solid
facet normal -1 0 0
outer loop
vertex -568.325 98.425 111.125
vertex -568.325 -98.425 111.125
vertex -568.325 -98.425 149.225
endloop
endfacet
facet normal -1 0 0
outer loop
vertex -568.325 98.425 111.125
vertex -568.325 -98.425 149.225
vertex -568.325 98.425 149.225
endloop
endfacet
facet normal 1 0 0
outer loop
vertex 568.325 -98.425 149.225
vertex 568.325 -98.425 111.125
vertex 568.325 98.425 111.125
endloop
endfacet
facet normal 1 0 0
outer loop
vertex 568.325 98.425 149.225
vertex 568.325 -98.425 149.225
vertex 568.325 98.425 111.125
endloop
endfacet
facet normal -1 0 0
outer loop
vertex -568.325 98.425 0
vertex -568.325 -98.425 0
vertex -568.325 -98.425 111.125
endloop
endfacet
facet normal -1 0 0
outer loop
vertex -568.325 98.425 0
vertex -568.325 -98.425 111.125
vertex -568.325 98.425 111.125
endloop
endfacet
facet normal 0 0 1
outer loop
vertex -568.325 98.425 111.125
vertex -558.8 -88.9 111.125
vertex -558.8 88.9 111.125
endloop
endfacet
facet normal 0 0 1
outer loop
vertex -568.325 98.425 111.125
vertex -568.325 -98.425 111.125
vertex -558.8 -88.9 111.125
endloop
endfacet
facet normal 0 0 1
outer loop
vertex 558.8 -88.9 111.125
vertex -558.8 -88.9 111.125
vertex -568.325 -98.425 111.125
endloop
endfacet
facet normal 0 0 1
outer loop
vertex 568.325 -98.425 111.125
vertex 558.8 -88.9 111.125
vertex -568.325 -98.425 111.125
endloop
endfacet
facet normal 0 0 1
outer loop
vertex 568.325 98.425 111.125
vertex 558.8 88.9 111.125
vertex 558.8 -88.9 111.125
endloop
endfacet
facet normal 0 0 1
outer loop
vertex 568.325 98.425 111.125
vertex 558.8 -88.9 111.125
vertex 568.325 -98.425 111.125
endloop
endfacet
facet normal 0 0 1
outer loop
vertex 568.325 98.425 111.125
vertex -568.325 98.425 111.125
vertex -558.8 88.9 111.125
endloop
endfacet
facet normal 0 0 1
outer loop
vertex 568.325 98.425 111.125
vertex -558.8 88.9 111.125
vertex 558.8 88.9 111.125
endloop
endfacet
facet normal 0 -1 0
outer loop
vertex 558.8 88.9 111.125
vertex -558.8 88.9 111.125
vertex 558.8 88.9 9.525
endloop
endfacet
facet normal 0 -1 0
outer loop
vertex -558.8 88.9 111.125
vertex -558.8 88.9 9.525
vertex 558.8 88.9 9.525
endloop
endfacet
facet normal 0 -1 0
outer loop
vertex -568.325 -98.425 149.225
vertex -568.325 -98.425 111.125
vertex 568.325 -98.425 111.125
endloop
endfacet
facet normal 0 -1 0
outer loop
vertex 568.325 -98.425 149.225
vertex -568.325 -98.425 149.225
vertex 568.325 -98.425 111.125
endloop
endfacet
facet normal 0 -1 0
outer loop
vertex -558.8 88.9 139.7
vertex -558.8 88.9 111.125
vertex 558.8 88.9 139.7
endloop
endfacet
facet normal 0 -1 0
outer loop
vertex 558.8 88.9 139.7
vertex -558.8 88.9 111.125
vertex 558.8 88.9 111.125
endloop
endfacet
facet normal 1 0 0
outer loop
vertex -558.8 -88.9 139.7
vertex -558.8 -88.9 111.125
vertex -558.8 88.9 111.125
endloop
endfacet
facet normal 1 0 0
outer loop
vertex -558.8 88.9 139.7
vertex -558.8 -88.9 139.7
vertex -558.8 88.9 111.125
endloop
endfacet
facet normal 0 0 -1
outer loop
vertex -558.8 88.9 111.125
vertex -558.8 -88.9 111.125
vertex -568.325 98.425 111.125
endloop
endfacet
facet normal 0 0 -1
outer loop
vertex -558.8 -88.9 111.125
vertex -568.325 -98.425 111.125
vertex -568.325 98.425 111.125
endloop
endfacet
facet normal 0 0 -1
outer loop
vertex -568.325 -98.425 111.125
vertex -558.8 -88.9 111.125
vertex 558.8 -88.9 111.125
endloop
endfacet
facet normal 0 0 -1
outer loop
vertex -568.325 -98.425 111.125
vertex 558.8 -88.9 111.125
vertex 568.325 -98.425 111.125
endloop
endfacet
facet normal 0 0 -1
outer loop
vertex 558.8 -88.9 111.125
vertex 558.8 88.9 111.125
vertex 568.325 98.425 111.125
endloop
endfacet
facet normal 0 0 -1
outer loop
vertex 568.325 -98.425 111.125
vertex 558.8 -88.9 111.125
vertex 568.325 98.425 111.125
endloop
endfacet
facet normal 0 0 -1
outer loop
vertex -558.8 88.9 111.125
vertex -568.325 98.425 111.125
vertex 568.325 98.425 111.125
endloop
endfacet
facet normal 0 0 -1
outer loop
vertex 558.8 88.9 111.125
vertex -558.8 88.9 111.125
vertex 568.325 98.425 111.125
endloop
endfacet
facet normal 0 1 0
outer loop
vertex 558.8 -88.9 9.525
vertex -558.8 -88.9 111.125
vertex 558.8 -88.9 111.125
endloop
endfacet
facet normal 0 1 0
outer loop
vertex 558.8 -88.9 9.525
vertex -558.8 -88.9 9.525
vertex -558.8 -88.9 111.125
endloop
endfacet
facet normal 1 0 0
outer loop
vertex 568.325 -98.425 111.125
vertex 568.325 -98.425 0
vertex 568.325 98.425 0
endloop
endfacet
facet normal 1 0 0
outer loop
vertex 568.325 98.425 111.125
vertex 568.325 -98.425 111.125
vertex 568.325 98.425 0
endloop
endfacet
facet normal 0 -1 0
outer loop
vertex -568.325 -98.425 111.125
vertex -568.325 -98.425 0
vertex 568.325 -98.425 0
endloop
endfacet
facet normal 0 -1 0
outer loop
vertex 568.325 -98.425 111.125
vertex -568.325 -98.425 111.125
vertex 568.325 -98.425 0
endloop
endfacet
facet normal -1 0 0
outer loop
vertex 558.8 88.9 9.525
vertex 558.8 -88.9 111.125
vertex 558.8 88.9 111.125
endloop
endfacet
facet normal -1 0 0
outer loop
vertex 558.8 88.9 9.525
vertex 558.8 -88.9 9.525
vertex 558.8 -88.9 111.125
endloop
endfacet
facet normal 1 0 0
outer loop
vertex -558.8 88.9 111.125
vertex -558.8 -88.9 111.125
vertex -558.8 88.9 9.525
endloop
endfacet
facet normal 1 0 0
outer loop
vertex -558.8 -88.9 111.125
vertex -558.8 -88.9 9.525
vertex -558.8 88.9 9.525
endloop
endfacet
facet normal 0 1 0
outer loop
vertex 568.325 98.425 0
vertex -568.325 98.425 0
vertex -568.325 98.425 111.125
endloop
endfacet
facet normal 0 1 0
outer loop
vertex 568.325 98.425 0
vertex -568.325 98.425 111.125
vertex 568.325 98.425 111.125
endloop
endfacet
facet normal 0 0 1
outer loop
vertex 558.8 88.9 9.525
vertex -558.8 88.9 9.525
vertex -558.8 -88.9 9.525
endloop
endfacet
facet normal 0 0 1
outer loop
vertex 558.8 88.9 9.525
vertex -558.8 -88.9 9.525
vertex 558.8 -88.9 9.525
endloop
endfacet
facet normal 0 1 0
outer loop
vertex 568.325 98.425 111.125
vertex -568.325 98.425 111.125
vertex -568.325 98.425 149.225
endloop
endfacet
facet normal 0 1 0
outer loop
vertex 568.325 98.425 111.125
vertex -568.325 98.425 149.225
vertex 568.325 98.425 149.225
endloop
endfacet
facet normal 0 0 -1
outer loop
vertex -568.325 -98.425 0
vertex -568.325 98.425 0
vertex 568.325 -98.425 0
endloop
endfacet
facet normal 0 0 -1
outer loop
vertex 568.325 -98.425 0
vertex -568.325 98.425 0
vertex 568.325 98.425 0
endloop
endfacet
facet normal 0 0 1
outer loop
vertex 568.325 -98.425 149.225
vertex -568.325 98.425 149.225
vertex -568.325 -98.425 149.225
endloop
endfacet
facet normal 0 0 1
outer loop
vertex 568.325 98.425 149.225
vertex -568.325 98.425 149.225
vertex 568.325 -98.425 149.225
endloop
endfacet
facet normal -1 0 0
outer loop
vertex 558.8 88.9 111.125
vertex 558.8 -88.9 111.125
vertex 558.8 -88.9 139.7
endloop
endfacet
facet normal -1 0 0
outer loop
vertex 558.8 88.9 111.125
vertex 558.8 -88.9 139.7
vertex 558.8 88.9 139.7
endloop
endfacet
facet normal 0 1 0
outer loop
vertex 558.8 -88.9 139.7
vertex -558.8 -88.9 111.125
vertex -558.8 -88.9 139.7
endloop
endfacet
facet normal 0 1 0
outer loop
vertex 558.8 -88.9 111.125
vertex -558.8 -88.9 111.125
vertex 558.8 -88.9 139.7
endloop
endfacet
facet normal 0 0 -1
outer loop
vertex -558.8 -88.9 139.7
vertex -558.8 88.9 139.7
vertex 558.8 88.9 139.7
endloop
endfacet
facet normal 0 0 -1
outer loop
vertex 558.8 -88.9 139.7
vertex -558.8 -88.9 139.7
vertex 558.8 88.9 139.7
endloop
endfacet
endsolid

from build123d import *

# Parameters (mm, degrees)
F0_W     = 1136.65
F0_H     = 196.85
F0_W_2   = 1117.6
F0_H_2   = 177.8
F1_DEPTH = 111.125
F2_DEPTH = 38.1
F3_T     = -9.525
F3_2_T   = -9.525


# Not quite as in the source:
# - a feature of the source that left no trace in its solid (it failed there, or was rolled back) is left out


with BuildPart() as f1:
    # F0 (on Top) → F1 (new body)
    with BuildSketch(Plane.XY):
        Rectangle(F0_W, F0_H)
        Rectangle(F0_W_2, F0_H_2, mode=Mode.SUBTRACT)
        Rectangle(F0_W_2, F0_H_2)
    extrude(amount=F1_DEPTH)


with BuildPart() as f2:
    # F2 (new): a face of the model
    f2_faces = [f1.part.faces().sort_by_distance(p)[0] for p in [
        (0, 0, 111.125),
    ]]
    extrude(f2_faces, amount=F2_DEPTH)

    # F3#2
    f3_2_openings = [f2.faces().sort_by_distance(p)[0] for p in [
        (0, 0, 111.125),
    ]]
    offset(amount=F3_2_T, openings=f3_2_openings)


with BuildPart() as f1_1:
    add(f1.part)

    # F3
    f3_openings = [f1_1.faces().sort_by_distance(p)[0] for p in [
        (0, 0, 111.125),
    ]]
    offset(amount=F3_T, openings=f3_openings)


solid = Compound([f2.part, f1_1.part])
